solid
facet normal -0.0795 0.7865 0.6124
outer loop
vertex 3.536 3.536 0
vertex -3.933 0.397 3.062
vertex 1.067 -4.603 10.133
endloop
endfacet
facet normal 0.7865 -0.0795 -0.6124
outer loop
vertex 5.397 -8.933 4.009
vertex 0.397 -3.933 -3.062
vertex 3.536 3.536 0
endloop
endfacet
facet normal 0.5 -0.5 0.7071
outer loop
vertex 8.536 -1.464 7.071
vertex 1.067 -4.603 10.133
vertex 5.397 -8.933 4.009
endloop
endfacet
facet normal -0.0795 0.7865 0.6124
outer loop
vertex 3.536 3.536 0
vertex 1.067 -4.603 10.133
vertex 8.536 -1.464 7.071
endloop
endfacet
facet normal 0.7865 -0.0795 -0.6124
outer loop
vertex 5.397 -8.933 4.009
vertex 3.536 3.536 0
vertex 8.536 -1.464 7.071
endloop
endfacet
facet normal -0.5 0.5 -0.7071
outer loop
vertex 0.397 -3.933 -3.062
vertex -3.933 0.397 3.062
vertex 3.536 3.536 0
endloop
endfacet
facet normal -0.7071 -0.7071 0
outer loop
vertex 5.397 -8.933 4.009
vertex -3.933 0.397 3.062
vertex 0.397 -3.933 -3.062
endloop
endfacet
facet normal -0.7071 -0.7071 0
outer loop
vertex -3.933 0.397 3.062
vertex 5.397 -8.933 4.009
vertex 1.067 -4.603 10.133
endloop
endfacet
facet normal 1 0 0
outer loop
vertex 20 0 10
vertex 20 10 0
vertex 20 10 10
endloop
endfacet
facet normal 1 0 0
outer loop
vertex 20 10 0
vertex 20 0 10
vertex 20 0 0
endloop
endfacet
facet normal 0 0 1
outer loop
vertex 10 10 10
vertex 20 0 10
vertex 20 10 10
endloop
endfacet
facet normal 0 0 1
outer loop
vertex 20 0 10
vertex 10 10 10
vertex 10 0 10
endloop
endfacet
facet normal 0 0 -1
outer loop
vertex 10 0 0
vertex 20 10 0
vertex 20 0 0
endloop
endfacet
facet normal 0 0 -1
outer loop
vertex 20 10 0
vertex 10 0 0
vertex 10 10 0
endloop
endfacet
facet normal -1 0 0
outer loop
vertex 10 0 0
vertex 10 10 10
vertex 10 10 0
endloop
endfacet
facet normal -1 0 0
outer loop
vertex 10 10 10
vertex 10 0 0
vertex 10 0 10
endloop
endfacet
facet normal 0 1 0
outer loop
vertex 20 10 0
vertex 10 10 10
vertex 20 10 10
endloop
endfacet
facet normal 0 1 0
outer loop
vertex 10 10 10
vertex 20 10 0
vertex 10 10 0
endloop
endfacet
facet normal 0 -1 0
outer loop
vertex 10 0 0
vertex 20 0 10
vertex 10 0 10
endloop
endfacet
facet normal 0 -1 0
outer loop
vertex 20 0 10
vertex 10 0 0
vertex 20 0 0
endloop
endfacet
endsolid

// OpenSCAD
$fn=50;
rotate([45,0,45])
cylinder(r=5,h=10,$fn=3); 
translate([10,0,0])
cube(10,10,10, center=false);
